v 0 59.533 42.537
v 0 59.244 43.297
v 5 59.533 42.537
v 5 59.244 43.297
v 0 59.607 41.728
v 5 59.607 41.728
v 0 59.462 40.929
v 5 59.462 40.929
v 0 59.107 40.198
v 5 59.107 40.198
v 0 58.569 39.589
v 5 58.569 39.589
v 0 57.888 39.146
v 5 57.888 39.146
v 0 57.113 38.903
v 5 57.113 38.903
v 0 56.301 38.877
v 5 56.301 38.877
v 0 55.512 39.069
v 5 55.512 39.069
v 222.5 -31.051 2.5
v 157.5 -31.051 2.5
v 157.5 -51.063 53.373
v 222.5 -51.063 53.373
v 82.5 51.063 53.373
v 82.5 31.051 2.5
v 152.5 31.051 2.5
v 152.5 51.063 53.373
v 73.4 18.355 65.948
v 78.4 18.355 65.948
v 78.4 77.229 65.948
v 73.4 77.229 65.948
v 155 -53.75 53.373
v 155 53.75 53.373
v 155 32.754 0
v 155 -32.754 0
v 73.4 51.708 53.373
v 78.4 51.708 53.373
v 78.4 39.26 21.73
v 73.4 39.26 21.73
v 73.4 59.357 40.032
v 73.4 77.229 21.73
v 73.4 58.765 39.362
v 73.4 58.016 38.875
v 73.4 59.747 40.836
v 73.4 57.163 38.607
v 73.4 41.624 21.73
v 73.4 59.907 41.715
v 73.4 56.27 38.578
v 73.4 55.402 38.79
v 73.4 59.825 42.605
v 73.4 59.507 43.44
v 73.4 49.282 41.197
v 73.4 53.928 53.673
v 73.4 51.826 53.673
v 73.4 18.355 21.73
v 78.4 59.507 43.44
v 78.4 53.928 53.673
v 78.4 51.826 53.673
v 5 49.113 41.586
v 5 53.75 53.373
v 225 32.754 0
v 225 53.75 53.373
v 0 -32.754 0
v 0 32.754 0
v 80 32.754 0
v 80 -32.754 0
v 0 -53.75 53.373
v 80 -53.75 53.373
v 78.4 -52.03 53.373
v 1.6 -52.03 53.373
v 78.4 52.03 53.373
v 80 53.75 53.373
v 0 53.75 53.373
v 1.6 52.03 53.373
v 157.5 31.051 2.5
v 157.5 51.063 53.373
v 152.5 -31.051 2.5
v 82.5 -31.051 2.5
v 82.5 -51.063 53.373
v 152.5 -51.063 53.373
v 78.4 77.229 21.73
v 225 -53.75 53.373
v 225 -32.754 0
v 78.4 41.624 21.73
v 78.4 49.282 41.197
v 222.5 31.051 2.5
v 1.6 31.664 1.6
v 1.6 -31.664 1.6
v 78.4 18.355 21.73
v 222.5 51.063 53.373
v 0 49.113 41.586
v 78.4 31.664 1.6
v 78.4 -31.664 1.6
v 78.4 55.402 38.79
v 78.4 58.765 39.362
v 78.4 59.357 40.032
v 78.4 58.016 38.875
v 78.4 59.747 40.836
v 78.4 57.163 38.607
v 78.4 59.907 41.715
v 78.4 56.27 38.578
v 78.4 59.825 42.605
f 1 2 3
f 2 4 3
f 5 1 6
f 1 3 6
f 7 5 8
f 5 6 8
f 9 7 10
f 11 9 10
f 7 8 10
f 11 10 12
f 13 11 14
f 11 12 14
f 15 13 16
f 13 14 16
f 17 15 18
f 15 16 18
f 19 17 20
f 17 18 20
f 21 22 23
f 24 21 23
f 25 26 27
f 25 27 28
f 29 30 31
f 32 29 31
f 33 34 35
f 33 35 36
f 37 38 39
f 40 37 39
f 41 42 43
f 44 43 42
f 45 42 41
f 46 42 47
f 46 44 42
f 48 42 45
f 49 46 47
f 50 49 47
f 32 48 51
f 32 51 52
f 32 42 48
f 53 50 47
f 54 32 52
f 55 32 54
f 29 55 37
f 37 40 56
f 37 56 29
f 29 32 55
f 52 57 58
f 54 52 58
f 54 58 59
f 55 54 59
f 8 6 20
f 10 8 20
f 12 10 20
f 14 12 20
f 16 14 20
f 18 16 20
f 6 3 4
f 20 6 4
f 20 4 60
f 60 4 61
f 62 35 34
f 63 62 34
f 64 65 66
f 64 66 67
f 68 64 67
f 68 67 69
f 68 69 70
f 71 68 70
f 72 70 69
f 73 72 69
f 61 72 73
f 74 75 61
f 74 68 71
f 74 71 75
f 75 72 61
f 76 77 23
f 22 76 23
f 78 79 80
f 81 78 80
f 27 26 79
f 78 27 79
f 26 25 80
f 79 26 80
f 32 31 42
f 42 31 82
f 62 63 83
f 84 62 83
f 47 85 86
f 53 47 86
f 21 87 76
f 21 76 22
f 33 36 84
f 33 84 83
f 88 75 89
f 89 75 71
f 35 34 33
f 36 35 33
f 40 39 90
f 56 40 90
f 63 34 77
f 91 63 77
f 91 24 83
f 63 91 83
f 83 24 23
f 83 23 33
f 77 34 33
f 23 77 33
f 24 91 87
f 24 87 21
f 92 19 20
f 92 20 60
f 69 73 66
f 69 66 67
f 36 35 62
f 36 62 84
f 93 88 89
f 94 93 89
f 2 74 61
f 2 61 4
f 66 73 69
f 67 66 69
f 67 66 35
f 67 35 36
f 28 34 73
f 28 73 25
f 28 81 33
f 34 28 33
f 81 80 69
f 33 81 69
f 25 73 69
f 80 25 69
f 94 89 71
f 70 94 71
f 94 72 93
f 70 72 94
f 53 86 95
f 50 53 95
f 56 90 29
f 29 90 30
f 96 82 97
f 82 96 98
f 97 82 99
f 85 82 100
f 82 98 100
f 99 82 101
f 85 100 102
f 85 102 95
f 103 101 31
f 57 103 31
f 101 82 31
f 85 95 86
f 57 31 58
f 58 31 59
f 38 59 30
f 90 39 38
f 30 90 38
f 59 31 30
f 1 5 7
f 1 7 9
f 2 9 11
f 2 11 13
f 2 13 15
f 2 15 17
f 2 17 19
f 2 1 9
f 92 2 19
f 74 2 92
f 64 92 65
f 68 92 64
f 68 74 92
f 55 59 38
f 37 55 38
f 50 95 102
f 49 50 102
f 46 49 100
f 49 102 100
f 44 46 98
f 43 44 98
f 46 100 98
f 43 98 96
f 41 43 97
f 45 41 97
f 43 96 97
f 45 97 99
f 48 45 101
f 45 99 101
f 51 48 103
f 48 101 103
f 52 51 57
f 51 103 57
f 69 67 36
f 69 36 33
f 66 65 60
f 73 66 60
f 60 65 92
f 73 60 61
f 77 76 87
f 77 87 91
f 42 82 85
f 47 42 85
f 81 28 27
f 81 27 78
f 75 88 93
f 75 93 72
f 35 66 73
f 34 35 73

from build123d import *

# Parameters (mm, degrees)
F1_DEPTH  = 80
F3_T      = -1.6
F4_DEPTH  = 75
F5_DEPTH  = 70
F6_T      = -2.5
F7_T      = -2.5
F9_DEPTH  = 5
F10_R     = 3
F12_DEPTH = 5


with BuildPart() as f1:
    # F0 (on Right) → F1 (new body)
    with BuildSketch(Plane.YZ):
        Polygon((0, 53.3730685711), (0, 0), (32.7537469566, 0), (53.7497512996, 53.3730685711), align=None)
    extrude(amount=F1_DEPTH)

    # F2: F1 across face


with BuildPart() as f1_1:
    add(f1.part)
    add(f1.part.mirror(Plane(origin=(40, 0, 26.6865342855), x_dir=(1, 0, 0), z_dir=(0, -1, 0))))

    # F3
    f3_openings = [f1_1.faces().sort_by_distance(p)[0] for p in [
        (40, 0, 53.373069),
    ]]
    offset(amount=F3_T, openings=f3_openings)


with BuildPart() as f4:
    # F4 (new): a face of the model
    f4_faces = [f1_1.part.faces().sort_by_distance(p)[0] for p in [
        (80, 0, 28.8456399905),
    ]]
    extrude(f4_faces, amount=F4_DEPTH)


with BuildPart() as f5:
    # F5 (new): a face of the model
    f5_faces = [f4.part.faces().sort_by_distance(p)[0] for p in [
        (155, 0, 28.8456399905),
    ]]
    extrude(f5_faces, amount=F5_DEPTH)

    # F7
    f7_openings = [f5.faces().sort_by_distance(p)[0] for p in [
        (190, 0, 53.373069),
    ]]
    offset(amount=F7_T, openings=f7_openings)


with BuildPart() as f4_1:
    add(f4.part)

    # F6
    f6_openings = [f4_1.faces().sort_by_distance(p)[0] for p in [
        (117.5, 0, 53.373069),
    ]]
    offset(amount=F6_T, openings=f6_openings)


with BuildPart() as f1_2:
    add(f1_1.part)

    # F8 (on face) → F9 (join)
    with BuildSketch(Plane(origin=(0, 0, 0), x_dir=(0, -1, 0), z_dir=(-1, 0, 0))):
        Polygon((-49.1129162171, 41.5859631405), (-53.7497512996, 53.3730685711), (-63.1975457742, 36.0453234271), align=None)
    extrude(amount=-F9_DEPTH)

    # F10
    f10_edges = [f1_2.edges().sort_by_distance(p)[0] for p in [
        (2.5, 63.197546, 36.045323),
    ]]
    fillet(f10_edges, radius=F10_R)


with BuildPart() as f12:
    # F11 (on face) → F12 (new body)
    with BuildSketch(Plane(origin=(78.4, 0, 0), x_dir=(0, -1, 0), z_dir=(-1, 0, 0))):
        with BuildLine():
            Line((-51.826039835, 53.6730685711), (-51.7080252357, 53.3730685711))
            Line((-51.7080252357, 53.3730685711), (-18.35501194, 53.3730685711))
            Line((-18.35501194, 53.3730685711), (-18.35501194, 65.9478157759))
            Line((-18.35501194, 65.9478157759), (-77.2292464972, 65.9478157759))
            Line((-77.2292464972, 65.9478157759), (-77.2292464972, 21.7295140028))
            Line((-77.2292464972, 21.7295140028), (-41.6241243857, 21.7295140028))
            Line((-41.6241243857, 21.7295140028), (-49.2822691324, 41.1969649527))
            Line((-49.2822691324, 41.1969649527), (-55.4018303725, 38.7896397265))
            ThreePointArc((-55.4018303725, 38.7896397265), (-59.0838597197, 39.6766703304), (-59.5071949999, 43.4403056271))
            Line((-59.5071949999, 43.4403056271), (-53.9278746441, 53.6730685711))
            Line((-53.9278746441, 53.6730685711), (-51.826039835, 53.6730685711))
        make_face()
        Polygon((-18.35501194, 53.3730685711), (-51.7080252357, 53.3730685711), (-39.2600205222, 21.7295140028), (-18.35501194, 21.7295140028), align=None)
    extrude(amount=F12_DEPTH)


solid = Compound([f5.part, f4_1.part, f1_2.part, f12.part])
